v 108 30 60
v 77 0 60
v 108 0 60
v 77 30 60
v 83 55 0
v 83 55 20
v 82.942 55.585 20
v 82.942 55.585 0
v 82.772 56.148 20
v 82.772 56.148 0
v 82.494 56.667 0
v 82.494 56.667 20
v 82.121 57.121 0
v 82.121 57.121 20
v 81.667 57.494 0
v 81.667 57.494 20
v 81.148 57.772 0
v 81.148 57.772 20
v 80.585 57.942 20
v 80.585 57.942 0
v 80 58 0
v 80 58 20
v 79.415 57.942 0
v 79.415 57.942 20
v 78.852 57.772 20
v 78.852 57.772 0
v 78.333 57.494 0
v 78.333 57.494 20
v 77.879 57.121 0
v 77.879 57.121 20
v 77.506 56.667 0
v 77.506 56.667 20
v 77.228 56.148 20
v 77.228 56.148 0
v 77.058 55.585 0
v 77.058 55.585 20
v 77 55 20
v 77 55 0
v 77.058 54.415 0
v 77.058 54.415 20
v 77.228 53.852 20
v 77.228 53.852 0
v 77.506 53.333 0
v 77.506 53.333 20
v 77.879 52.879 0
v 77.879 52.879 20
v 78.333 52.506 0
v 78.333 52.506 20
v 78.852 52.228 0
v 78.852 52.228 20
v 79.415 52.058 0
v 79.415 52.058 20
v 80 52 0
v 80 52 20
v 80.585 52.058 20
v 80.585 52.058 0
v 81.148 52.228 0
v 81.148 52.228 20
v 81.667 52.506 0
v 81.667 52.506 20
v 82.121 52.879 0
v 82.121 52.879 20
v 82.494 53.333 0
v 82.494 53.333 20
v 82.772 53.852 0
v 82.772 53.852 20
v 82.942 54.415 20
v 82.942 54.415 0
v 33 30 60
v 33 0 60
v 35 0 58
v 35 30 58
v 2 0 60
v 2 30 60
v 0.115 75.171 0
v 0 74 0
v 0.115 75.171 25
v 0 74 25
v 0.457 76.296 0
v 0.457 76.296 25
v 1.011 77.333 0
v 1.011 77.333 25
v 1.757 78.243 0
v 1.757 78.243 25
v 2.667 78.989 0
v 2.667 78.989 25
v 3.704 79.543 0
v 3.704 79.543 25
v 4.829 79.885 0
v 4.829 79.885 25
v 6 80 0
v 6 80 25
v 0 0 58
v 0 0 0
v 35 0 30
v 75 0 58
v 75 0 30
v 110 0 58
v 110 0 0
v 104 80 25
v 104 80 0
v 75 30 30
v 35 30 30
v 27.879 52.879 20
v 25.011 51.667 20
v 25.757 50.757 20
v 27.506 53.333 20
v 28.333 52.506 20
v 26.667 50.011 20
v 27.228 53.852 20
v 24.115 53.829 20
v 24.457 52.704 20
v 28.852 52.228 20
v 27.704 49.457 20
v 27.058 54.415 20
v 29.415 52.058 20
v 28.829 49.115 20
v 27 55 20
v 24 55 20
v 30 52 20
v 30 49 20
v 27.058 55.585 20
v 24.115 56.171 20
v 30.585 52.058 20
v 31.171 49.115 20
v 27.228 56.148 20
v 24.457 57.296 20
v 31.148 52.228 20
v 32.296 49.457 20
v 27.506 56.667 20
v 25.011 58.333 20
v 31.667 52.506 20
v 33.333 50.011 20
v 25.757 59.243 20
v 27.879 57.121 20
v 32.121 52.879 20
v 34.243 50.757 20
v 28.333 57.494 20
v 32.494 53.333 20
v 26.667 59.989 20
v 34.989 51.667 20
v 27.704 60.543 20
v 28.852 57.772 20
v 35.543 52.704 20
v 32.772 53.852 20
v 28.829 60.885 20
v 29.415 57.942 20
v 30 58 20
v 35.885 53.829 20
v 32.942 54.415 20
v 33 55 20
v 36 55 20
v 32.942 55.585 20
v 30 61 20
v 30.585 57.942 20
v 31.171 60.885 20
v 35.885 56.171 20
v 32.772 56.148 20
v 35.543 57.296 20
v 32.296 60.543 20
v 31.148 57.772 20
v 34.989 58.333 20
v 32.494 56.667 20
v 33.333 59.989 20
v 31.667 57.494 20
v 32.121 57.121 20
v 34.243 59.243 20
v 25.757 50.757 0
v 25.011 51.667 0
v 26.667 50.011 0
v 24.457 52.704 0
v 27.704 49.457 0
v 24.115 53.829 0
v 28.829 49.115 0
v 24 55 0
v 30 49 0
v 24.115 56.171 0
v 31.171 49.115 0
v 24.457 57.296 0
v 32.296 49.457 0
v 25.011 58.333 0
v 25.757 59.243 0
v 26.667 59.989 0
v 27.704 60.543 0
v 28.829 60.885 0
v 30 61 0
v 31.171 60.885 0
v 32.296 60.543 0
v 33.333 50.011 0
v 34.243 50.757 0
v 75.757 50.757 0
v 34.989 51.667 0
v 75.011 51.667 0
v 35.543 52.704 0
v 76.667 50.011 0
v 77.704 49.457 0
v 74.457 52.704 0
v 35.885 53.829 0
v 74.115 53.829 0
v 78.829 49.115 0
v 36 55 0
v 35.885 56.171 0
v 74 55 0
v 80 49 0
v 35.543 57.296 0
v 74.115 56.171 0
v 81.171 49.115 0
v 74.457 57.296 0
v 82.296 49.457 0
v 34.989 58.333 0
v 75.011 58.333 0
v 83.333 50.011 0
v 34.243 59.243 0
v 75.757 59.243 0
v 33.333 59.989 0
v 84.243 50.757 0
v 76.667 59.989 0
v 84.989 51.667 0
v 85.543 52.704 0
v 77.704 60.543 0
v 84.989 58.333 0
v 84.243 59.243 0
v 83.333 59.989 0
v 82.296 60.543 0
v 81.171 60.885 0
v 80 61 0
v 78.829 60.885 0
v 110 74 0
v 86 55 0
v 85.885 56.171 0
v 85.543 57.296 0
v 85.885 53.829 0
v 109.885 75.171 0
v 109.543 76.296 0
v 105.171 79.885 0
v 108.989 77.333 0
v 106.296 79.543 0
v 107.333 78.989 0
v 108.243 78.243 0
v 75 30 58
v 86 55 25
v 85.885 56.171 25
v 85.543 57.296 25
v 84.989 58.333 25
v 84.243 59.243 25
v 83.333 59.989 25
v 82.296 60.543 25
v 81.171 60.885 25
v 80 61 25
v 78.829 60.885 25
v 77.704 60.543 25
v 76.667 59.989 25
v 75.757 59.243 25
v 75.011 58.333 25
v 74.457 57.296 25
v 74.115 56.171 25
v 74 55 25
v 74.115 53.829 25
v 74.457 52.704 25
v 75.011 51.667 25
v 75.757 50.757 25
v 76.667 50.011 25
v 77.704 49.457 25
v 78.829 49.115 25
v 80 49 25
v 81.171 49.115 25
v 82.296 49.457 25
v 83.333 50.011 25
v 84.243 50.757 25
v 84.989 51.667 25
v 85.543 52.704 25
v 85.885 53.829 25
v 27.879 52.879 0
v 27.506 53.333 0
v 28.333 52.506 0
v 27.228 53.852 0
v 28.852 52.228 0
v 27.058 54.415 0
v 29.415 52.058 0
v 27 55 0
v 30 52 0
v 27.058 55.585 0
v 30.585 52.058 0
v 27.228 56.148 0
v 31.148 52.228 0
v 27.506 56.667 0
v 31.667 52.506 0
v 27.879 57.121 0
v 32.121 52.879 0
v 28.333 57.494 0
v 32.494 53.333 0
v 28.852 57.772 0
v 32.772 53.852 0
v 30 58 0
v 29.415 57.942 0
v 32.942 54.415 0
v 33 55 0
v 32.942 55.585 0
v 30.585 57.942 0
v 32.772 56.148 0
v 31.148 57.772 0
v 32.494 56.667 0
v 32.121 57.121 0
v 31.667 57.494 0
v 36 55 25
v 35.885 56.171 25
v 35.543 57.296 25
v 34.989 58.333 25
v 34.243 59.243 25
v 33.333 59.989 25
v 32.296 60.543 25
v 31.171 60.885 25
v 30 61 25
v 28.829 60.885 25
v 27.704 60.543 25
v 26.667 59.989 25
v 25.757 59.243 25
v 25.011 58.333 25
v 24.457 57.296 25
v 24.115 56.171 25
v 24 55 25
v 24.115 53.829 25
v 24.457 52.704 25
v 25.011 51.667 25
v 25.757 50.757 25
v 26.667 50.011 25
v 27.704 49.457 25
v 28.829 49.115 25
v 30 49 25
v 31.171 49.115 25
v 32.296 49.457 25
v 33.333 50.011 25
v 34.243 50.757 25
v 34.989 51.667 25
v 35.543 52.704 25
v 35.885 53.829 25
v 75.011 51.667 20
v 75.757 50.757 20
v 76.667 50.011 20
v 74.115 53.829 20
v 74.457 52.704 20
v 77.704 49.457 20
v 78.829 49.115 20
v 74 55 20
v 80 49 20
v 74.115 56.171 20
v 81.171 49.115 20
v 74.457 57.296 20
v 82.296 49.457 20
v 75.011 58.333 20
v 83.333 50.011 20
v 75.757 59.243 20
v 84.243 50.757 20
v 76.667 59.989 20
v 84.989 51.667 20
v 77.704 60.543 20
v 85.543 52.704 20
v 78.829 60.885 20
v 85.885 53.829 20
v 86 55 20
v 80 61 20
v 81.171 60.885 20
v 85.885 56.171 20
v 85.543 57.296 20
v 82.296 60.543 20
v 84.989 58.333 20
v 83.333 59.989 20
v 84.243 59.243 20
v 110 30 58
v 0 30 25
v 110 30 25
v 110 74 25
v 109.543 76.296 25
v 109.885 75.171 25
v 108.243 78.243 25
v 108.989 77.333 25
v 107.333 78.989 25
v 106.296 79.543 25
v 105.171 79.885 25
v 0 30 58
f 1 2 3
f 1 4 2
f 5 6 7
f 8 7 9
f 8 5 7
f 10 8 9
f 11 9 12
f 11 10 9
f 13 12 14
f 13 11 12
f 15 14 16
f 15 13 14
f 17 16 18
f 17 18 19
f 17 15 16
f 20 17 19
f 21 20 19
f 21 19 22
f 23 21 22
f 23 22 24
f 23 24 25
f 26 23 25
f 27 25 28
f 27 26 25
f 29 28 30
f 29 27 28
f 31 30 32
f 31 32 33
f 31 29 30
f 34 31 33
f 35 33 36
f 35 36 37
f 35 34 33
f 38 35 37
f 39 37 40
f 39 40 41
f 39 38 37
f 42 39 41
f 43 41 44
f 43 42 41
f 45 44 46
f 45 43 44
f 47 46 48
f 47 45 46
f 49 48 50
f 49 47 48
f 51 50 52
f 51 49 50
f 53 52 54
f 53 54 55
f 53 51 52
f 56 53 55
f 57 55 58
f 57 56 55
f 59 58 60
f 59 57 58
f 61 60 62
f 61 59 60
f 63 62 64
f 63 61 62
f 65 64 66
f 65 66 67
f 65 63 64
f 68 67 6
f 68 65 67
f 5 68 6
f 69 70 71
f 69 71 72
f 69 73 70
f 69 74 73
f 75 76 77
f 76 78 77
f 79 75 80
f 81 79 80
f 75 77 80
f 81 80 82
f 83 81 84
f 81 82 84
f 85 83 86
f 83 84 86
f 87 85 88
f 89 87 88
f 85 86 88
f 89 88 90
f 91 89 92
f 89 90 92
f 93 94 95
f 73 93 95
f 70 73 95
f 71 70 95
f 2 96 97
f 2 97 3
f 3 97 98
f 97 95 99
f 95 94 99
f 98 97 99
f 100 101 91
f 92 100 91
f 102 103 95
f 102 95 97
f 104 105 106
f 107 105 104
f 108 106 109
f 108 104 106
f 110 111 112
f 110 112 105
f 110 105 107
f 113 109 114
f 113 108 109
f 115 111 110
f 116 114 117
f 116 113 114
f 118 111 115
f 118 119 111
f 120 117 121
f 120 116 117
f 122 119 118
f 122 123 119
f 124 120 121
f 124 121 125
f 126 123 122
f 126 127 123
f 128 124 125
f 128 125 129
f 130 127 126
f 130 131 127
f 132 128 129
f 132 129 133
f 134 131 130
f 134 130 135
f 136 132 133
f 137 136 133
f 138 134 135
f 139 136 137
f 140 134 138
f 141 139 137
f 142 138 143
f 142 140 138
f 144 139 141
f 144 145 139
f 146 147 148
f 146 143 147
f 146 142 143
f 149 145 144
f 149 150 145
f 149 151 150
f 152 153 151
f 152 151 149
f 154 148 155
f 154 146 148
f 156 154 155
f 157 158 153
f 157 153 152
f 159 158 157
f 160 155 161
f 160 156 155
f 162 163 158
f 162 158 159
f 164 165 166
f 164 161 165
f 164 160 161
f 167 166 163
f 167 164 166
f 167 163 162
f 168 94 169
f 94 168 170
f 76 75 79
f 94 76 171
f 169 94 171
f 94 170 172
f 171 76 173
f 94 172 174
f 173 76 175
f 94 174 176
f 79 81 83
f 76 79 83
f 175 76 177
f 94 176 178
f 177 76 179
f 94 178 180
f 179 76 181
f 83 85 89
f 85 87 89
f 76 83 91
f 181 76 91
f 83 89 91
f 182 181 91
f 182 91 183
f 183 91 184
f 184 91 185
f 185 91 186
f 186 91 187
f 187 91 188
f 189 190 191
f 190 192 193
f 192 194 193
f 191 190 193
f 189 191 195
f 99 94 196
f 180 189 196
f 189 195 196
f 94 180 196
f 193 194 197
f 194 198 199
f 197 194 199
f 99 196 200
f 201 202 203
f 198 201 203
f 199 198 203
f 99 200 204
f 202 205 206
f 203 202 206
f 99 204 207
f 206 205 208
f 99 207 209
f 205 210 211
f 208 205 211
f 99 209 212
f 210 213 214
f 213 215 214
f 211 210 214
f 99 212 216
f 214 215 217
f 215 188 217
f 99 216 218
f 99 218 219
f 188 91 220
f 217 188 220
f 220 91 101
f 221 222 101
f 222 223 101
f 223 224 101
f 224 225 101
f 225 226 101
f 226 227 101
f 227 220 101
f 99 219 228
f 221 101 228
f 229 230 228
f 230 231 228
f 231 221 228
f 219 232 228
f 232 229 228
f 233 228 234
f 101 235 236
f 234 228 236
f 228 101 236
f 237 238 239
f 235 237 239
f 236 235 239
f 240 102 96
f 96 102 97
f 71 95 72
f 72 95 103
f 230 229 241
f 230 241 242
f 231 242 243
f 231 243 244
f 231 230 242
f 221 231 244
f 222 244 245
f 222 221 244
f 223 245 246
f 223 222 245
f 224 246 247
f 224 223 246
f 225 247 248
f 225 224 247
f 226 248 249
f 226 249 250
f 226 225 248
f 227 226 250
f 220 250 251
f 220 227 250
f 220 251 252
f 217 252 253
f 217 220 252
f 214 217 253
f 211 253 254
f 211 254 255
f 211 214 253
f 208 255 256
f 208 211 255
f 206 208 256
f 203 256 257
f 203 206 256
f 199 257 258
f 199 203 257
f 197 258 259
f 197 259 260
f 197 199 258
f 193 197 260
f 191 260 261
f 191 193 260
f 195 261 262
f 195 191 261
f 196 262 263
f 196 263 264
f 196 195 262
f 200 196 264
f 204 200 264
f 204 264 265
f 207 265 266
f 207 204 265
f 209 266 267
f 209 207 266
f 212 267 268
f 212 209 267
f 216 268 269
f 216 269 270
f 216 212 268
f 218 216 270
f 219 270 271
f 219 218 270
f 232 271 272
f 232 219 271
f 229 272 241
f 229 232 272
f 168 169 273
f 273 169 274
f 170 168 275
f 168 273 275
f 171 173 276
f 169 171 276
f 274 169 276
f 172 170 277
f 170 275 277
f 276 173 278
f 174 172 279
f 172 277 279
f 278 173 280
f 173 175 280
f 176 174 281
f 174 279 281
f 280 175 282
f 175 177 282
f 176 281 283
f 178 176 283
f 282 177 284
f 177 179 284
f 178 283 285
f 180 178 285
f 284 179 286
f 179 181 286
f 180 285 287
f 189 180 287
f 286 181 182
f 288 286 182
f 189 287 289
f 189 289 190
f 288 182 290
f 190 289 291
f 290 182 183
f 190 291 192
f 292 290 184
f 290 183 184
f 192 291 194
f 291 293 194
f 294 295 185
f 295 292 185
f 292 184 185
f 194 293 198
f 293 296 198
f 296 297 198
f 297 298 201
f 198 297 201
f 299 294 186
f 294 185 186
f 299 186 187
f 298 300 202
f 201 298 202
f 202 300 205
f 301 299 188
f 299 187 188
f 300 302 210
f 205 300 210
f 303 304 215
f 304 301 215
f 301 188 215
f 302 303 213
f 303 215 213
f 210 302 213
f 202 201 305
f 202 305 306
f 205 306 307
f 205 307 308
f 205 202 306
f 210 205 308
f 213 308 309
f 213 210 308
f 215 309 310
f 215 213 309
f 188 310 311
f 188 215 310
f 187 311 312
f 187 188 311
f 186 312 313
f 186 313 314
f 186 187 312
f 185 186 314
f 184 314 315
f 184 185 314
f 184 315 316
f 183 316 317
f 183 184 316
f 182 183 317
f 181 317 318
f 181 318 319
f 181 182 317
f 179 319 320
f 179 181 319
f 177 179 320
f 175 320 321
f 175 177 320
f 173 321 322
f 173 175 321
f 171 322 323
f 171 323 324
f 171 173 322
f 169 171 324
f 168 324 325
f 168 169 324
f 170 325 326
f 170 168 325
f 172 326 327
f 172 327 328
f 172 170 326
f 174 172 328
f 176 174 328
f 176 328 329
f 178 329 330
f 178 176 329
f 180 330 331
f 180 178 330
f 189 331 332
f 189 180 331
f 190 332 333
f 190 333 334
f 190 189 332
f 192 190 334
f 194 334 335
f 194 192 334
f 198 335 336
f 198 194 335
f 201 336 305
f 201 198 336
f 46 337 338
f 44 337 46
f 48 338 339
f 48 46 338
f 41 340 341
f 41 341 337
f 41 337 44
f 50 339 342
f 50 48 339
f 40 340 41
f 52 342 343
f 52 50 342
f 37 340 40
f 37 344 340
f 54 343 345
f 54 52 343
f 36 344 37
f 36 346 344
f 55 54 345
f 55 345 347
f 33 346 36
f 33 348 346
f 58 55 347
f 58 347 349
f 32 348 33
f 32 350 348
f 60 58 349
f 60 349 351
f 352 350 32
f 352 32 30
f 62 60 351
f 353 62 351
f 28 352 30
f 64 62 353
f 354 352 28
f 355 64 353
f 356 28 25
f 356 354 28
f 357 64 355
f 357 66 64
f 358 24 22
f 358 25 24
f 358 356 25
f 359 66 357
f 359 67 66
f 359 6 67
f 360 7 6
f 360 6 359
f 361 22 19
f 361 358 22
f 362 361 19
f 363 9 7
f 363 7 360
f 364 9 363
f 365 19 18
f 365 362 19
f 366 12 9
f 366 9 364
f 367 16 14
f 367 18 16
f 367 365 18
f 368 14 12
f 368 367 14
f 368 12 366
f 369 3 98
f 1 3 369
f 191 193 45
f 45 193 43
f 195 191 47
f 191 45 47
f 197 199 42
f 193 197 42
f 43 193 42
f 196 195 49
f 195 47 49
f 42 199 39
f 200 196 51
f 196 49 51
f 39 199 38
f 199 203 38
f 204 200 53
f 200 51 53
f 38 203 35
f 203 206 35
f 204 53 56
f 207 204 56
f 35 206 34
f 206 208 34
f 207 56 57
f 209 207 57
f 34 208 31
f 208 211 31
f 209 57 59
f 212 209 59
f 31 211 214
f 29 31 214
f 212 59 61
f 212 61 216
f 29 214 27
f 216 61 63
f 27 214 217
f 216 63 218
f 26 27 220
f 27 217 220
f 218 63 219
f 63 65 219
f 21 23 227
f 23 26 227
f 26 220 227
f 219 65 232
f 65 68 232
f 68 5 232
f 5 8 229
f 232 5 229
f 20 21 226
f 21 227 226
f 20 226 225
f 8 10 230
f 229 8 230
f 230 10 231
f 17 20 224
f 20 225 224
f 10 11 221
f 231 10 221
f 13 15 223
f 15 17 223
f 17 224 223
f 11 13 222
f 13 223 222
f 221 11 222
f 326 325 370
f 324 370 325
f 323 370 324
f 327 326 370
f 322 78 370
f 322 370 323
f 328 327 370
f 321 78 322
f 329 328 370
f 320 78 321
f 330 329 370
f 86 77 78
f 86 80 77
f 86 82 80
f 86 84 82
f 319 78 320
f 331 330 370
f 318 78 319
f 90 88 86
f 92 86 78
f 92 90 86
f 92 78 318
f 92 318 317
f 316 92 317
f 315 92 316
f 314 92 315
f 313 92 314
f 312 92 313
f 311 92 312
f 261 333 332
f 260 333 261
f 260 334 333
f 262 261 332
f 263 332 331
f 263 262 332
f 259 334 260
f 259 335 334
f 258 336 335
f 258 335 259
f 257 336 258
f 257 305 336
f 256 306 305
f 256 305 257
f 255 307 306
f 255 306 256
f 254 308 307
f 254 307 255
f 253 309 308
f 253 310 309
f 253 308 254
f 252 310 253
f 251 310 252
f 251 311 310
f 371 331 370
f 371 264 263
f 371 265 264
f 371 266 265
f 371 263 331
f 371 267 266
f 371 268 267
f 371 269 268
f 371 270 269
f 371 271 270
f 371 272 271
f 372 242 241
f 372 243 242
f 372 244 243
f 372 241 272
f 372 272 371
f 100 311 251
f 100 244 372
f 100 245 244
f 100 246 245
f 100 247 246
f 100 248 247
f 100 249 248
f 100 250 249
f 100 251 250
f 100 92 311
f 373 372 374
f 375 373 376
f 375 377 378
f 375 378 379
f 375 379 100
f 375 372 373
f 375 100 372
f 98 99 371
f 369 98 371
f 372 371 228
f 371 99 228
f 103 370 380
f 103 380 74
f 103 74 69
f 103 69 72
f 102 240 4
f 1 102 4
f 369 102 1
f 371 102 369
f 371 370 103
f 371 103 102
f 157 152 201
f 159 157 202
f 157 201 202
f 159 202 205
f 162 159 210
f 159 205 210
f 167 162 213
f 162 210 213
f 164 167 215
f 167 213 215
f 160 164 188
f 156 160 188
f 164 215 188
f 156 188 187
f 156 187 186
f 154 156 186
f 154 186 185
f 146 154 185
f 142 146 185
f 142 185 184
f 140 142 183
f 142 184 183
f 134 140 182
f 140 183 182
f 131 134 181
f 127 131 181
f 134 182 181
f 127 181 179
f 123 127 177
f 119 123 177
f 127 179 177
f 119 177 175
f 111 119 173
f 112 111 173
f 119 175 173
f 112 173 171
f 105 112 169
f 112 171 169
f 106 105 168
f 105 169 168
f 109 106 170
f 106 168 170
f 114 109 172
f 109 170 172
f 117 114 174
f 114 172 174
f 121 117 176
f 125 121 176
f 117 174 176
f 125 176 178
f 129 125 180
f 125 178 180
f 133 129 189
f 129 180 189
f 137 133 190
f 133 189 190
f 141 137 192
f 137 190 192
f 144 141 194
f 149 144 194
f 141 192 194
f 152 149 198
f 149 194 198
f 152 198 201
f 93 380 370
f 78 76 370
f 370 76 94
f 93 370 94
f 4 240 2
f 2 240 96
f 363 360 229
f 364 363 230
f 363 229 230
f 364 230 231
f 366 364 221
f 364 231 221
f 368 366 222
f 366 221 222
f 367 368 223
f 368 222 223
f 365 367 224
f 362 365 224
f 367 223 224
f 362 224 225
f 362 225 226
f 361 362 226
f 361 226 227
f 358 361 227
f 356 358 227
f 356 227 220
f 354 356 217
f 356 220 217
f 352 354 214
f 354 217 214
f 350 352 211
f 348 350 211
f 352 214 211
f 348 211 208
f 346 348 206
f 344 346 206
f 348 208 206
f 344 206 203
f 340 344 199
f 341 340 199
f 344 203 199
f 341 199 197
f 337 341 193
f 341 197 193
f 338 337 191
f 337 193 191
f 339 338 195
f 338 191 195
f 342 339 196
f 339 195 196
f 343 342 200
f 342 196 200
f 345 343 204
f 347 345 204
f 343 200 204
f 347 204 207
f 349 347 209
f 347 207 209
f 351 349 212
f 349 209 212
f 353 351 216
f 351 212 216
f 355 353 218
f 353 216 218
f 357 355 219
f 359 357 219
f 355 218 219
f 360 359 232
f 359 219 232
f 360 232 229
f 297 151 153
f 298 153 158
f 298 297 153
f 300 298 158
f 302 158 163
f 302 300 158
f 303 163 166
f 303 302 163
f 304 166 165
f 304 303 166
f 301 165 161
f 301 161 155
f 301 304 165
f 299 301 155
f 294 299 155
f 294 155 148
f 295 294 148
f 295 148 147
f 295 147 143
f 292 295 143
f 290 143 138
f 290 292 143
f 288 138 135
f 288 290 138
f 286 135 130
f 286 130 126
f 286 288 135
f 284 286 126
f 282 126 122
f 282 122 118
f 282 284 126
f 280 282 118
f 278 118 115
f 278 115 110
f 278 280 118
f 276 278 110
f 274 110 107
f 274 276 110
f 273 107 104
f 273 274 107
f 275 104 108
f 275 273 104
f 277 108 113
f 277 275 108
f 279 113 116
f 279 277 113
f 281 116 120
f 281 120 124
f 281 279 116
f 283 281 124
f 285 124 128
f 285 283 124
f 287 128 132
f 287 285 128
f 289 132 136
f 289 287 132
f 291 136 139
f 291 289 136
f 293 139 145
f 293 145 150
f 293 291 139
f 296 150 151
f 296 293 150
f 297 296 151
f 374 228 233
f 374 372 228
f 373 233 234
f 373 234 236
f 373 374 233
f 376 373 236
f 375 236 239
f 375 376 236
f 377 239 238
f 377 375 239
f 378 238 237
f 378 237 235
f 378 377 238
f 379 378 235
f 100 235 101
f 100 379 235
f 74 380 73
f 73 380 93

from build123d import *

# Parameters (mm, degrees)
F0_R     = 6
F0_R_2   = 3
F1_DEPTH = 20
F2_DEPTH = 25
F3_DEPTH = 60
F0_W     = 40
F0_H     = 30
F4_DEPTH = 30
F5_SIZE  = 2
F6_R     = 6


with BuildPart() as f1:
    # F0 (on Top) → F1 (new body)
    with BuildSketch(Plane.XY):
        with Locations((30, 55)):
            Circle(F0_R)
        with Locations((30, 55)):
            Circle(F0_R_2, mode=Mode.SUBTRACT)
    extrude(amount=F1_DEPTH)


with BuildPart() as f1b:
    # F0 (on Top) → F1, piece 2 (new body)
    with BuildSketch(Plane.XY):
        with Locations((80, 55)):
            Circle(F0_R)
        with Locations((80, 55)):
            Circle(F0_R_2, mode=Mode.SUBTRACT)
    extrude(amount=F1_DEPTH)


with BuildPart() as f2:
    # F0 (on Top) → F2 (new body)
    with BuildSketch(Plane.XY):
        Polygon((0, 30), (35, 30), (75, 30), (110, 30), (110, 80), (0, 80), align=None)
        with Locations((30, 55)):
            Circle(F0_R, mode=Mode.SUBTRACT)
        with Locations((80, 55)):
            Circle(F0_R, mode=Mode.SUBTRACT)
    extrude(amount=F2_DEPTH)

    # F0 (on Top) → F3 (join)
    with BuildSketch(Plane.XY):
        Polygon((0, 0), (6, 0), (35, 0), (35, 30), (0, 30), (0, 6), align=None)
        Polygon((75, 30), (75, 0), (104, 0), (110, 0), (110, 6), (110, 30), align=None)
    extrude(amount=F3_DEPTH)

    # F0 (on Top) → F4 (join)
    with BuildSketch(Plane.XY):
        with Locations((55, 15)):
            Rectangle(F0_W, F0_H)
    extrude(amount=F4_DEPTH)

    # F5
    f5_edges = [f2.edges().sort_by_distance(p)[0] for p in [
        (110, 15, 60),
        (75, 15, 60),
        (35, 15, 60),
        (0, 15, 60),
    ]]
    chamfer(f5_edges, length=F5_SIZE)

    # F6
    f6_edges = [f2.edges().sort_by_distance(p)[0] for p in [
        (0, 80, 12.5),
        (110, 80, 12.5),
    ]]
    fillet(f6_edges, radius=F6_R)


solid = Compound([f1.part, f1b.part, f2.part])
